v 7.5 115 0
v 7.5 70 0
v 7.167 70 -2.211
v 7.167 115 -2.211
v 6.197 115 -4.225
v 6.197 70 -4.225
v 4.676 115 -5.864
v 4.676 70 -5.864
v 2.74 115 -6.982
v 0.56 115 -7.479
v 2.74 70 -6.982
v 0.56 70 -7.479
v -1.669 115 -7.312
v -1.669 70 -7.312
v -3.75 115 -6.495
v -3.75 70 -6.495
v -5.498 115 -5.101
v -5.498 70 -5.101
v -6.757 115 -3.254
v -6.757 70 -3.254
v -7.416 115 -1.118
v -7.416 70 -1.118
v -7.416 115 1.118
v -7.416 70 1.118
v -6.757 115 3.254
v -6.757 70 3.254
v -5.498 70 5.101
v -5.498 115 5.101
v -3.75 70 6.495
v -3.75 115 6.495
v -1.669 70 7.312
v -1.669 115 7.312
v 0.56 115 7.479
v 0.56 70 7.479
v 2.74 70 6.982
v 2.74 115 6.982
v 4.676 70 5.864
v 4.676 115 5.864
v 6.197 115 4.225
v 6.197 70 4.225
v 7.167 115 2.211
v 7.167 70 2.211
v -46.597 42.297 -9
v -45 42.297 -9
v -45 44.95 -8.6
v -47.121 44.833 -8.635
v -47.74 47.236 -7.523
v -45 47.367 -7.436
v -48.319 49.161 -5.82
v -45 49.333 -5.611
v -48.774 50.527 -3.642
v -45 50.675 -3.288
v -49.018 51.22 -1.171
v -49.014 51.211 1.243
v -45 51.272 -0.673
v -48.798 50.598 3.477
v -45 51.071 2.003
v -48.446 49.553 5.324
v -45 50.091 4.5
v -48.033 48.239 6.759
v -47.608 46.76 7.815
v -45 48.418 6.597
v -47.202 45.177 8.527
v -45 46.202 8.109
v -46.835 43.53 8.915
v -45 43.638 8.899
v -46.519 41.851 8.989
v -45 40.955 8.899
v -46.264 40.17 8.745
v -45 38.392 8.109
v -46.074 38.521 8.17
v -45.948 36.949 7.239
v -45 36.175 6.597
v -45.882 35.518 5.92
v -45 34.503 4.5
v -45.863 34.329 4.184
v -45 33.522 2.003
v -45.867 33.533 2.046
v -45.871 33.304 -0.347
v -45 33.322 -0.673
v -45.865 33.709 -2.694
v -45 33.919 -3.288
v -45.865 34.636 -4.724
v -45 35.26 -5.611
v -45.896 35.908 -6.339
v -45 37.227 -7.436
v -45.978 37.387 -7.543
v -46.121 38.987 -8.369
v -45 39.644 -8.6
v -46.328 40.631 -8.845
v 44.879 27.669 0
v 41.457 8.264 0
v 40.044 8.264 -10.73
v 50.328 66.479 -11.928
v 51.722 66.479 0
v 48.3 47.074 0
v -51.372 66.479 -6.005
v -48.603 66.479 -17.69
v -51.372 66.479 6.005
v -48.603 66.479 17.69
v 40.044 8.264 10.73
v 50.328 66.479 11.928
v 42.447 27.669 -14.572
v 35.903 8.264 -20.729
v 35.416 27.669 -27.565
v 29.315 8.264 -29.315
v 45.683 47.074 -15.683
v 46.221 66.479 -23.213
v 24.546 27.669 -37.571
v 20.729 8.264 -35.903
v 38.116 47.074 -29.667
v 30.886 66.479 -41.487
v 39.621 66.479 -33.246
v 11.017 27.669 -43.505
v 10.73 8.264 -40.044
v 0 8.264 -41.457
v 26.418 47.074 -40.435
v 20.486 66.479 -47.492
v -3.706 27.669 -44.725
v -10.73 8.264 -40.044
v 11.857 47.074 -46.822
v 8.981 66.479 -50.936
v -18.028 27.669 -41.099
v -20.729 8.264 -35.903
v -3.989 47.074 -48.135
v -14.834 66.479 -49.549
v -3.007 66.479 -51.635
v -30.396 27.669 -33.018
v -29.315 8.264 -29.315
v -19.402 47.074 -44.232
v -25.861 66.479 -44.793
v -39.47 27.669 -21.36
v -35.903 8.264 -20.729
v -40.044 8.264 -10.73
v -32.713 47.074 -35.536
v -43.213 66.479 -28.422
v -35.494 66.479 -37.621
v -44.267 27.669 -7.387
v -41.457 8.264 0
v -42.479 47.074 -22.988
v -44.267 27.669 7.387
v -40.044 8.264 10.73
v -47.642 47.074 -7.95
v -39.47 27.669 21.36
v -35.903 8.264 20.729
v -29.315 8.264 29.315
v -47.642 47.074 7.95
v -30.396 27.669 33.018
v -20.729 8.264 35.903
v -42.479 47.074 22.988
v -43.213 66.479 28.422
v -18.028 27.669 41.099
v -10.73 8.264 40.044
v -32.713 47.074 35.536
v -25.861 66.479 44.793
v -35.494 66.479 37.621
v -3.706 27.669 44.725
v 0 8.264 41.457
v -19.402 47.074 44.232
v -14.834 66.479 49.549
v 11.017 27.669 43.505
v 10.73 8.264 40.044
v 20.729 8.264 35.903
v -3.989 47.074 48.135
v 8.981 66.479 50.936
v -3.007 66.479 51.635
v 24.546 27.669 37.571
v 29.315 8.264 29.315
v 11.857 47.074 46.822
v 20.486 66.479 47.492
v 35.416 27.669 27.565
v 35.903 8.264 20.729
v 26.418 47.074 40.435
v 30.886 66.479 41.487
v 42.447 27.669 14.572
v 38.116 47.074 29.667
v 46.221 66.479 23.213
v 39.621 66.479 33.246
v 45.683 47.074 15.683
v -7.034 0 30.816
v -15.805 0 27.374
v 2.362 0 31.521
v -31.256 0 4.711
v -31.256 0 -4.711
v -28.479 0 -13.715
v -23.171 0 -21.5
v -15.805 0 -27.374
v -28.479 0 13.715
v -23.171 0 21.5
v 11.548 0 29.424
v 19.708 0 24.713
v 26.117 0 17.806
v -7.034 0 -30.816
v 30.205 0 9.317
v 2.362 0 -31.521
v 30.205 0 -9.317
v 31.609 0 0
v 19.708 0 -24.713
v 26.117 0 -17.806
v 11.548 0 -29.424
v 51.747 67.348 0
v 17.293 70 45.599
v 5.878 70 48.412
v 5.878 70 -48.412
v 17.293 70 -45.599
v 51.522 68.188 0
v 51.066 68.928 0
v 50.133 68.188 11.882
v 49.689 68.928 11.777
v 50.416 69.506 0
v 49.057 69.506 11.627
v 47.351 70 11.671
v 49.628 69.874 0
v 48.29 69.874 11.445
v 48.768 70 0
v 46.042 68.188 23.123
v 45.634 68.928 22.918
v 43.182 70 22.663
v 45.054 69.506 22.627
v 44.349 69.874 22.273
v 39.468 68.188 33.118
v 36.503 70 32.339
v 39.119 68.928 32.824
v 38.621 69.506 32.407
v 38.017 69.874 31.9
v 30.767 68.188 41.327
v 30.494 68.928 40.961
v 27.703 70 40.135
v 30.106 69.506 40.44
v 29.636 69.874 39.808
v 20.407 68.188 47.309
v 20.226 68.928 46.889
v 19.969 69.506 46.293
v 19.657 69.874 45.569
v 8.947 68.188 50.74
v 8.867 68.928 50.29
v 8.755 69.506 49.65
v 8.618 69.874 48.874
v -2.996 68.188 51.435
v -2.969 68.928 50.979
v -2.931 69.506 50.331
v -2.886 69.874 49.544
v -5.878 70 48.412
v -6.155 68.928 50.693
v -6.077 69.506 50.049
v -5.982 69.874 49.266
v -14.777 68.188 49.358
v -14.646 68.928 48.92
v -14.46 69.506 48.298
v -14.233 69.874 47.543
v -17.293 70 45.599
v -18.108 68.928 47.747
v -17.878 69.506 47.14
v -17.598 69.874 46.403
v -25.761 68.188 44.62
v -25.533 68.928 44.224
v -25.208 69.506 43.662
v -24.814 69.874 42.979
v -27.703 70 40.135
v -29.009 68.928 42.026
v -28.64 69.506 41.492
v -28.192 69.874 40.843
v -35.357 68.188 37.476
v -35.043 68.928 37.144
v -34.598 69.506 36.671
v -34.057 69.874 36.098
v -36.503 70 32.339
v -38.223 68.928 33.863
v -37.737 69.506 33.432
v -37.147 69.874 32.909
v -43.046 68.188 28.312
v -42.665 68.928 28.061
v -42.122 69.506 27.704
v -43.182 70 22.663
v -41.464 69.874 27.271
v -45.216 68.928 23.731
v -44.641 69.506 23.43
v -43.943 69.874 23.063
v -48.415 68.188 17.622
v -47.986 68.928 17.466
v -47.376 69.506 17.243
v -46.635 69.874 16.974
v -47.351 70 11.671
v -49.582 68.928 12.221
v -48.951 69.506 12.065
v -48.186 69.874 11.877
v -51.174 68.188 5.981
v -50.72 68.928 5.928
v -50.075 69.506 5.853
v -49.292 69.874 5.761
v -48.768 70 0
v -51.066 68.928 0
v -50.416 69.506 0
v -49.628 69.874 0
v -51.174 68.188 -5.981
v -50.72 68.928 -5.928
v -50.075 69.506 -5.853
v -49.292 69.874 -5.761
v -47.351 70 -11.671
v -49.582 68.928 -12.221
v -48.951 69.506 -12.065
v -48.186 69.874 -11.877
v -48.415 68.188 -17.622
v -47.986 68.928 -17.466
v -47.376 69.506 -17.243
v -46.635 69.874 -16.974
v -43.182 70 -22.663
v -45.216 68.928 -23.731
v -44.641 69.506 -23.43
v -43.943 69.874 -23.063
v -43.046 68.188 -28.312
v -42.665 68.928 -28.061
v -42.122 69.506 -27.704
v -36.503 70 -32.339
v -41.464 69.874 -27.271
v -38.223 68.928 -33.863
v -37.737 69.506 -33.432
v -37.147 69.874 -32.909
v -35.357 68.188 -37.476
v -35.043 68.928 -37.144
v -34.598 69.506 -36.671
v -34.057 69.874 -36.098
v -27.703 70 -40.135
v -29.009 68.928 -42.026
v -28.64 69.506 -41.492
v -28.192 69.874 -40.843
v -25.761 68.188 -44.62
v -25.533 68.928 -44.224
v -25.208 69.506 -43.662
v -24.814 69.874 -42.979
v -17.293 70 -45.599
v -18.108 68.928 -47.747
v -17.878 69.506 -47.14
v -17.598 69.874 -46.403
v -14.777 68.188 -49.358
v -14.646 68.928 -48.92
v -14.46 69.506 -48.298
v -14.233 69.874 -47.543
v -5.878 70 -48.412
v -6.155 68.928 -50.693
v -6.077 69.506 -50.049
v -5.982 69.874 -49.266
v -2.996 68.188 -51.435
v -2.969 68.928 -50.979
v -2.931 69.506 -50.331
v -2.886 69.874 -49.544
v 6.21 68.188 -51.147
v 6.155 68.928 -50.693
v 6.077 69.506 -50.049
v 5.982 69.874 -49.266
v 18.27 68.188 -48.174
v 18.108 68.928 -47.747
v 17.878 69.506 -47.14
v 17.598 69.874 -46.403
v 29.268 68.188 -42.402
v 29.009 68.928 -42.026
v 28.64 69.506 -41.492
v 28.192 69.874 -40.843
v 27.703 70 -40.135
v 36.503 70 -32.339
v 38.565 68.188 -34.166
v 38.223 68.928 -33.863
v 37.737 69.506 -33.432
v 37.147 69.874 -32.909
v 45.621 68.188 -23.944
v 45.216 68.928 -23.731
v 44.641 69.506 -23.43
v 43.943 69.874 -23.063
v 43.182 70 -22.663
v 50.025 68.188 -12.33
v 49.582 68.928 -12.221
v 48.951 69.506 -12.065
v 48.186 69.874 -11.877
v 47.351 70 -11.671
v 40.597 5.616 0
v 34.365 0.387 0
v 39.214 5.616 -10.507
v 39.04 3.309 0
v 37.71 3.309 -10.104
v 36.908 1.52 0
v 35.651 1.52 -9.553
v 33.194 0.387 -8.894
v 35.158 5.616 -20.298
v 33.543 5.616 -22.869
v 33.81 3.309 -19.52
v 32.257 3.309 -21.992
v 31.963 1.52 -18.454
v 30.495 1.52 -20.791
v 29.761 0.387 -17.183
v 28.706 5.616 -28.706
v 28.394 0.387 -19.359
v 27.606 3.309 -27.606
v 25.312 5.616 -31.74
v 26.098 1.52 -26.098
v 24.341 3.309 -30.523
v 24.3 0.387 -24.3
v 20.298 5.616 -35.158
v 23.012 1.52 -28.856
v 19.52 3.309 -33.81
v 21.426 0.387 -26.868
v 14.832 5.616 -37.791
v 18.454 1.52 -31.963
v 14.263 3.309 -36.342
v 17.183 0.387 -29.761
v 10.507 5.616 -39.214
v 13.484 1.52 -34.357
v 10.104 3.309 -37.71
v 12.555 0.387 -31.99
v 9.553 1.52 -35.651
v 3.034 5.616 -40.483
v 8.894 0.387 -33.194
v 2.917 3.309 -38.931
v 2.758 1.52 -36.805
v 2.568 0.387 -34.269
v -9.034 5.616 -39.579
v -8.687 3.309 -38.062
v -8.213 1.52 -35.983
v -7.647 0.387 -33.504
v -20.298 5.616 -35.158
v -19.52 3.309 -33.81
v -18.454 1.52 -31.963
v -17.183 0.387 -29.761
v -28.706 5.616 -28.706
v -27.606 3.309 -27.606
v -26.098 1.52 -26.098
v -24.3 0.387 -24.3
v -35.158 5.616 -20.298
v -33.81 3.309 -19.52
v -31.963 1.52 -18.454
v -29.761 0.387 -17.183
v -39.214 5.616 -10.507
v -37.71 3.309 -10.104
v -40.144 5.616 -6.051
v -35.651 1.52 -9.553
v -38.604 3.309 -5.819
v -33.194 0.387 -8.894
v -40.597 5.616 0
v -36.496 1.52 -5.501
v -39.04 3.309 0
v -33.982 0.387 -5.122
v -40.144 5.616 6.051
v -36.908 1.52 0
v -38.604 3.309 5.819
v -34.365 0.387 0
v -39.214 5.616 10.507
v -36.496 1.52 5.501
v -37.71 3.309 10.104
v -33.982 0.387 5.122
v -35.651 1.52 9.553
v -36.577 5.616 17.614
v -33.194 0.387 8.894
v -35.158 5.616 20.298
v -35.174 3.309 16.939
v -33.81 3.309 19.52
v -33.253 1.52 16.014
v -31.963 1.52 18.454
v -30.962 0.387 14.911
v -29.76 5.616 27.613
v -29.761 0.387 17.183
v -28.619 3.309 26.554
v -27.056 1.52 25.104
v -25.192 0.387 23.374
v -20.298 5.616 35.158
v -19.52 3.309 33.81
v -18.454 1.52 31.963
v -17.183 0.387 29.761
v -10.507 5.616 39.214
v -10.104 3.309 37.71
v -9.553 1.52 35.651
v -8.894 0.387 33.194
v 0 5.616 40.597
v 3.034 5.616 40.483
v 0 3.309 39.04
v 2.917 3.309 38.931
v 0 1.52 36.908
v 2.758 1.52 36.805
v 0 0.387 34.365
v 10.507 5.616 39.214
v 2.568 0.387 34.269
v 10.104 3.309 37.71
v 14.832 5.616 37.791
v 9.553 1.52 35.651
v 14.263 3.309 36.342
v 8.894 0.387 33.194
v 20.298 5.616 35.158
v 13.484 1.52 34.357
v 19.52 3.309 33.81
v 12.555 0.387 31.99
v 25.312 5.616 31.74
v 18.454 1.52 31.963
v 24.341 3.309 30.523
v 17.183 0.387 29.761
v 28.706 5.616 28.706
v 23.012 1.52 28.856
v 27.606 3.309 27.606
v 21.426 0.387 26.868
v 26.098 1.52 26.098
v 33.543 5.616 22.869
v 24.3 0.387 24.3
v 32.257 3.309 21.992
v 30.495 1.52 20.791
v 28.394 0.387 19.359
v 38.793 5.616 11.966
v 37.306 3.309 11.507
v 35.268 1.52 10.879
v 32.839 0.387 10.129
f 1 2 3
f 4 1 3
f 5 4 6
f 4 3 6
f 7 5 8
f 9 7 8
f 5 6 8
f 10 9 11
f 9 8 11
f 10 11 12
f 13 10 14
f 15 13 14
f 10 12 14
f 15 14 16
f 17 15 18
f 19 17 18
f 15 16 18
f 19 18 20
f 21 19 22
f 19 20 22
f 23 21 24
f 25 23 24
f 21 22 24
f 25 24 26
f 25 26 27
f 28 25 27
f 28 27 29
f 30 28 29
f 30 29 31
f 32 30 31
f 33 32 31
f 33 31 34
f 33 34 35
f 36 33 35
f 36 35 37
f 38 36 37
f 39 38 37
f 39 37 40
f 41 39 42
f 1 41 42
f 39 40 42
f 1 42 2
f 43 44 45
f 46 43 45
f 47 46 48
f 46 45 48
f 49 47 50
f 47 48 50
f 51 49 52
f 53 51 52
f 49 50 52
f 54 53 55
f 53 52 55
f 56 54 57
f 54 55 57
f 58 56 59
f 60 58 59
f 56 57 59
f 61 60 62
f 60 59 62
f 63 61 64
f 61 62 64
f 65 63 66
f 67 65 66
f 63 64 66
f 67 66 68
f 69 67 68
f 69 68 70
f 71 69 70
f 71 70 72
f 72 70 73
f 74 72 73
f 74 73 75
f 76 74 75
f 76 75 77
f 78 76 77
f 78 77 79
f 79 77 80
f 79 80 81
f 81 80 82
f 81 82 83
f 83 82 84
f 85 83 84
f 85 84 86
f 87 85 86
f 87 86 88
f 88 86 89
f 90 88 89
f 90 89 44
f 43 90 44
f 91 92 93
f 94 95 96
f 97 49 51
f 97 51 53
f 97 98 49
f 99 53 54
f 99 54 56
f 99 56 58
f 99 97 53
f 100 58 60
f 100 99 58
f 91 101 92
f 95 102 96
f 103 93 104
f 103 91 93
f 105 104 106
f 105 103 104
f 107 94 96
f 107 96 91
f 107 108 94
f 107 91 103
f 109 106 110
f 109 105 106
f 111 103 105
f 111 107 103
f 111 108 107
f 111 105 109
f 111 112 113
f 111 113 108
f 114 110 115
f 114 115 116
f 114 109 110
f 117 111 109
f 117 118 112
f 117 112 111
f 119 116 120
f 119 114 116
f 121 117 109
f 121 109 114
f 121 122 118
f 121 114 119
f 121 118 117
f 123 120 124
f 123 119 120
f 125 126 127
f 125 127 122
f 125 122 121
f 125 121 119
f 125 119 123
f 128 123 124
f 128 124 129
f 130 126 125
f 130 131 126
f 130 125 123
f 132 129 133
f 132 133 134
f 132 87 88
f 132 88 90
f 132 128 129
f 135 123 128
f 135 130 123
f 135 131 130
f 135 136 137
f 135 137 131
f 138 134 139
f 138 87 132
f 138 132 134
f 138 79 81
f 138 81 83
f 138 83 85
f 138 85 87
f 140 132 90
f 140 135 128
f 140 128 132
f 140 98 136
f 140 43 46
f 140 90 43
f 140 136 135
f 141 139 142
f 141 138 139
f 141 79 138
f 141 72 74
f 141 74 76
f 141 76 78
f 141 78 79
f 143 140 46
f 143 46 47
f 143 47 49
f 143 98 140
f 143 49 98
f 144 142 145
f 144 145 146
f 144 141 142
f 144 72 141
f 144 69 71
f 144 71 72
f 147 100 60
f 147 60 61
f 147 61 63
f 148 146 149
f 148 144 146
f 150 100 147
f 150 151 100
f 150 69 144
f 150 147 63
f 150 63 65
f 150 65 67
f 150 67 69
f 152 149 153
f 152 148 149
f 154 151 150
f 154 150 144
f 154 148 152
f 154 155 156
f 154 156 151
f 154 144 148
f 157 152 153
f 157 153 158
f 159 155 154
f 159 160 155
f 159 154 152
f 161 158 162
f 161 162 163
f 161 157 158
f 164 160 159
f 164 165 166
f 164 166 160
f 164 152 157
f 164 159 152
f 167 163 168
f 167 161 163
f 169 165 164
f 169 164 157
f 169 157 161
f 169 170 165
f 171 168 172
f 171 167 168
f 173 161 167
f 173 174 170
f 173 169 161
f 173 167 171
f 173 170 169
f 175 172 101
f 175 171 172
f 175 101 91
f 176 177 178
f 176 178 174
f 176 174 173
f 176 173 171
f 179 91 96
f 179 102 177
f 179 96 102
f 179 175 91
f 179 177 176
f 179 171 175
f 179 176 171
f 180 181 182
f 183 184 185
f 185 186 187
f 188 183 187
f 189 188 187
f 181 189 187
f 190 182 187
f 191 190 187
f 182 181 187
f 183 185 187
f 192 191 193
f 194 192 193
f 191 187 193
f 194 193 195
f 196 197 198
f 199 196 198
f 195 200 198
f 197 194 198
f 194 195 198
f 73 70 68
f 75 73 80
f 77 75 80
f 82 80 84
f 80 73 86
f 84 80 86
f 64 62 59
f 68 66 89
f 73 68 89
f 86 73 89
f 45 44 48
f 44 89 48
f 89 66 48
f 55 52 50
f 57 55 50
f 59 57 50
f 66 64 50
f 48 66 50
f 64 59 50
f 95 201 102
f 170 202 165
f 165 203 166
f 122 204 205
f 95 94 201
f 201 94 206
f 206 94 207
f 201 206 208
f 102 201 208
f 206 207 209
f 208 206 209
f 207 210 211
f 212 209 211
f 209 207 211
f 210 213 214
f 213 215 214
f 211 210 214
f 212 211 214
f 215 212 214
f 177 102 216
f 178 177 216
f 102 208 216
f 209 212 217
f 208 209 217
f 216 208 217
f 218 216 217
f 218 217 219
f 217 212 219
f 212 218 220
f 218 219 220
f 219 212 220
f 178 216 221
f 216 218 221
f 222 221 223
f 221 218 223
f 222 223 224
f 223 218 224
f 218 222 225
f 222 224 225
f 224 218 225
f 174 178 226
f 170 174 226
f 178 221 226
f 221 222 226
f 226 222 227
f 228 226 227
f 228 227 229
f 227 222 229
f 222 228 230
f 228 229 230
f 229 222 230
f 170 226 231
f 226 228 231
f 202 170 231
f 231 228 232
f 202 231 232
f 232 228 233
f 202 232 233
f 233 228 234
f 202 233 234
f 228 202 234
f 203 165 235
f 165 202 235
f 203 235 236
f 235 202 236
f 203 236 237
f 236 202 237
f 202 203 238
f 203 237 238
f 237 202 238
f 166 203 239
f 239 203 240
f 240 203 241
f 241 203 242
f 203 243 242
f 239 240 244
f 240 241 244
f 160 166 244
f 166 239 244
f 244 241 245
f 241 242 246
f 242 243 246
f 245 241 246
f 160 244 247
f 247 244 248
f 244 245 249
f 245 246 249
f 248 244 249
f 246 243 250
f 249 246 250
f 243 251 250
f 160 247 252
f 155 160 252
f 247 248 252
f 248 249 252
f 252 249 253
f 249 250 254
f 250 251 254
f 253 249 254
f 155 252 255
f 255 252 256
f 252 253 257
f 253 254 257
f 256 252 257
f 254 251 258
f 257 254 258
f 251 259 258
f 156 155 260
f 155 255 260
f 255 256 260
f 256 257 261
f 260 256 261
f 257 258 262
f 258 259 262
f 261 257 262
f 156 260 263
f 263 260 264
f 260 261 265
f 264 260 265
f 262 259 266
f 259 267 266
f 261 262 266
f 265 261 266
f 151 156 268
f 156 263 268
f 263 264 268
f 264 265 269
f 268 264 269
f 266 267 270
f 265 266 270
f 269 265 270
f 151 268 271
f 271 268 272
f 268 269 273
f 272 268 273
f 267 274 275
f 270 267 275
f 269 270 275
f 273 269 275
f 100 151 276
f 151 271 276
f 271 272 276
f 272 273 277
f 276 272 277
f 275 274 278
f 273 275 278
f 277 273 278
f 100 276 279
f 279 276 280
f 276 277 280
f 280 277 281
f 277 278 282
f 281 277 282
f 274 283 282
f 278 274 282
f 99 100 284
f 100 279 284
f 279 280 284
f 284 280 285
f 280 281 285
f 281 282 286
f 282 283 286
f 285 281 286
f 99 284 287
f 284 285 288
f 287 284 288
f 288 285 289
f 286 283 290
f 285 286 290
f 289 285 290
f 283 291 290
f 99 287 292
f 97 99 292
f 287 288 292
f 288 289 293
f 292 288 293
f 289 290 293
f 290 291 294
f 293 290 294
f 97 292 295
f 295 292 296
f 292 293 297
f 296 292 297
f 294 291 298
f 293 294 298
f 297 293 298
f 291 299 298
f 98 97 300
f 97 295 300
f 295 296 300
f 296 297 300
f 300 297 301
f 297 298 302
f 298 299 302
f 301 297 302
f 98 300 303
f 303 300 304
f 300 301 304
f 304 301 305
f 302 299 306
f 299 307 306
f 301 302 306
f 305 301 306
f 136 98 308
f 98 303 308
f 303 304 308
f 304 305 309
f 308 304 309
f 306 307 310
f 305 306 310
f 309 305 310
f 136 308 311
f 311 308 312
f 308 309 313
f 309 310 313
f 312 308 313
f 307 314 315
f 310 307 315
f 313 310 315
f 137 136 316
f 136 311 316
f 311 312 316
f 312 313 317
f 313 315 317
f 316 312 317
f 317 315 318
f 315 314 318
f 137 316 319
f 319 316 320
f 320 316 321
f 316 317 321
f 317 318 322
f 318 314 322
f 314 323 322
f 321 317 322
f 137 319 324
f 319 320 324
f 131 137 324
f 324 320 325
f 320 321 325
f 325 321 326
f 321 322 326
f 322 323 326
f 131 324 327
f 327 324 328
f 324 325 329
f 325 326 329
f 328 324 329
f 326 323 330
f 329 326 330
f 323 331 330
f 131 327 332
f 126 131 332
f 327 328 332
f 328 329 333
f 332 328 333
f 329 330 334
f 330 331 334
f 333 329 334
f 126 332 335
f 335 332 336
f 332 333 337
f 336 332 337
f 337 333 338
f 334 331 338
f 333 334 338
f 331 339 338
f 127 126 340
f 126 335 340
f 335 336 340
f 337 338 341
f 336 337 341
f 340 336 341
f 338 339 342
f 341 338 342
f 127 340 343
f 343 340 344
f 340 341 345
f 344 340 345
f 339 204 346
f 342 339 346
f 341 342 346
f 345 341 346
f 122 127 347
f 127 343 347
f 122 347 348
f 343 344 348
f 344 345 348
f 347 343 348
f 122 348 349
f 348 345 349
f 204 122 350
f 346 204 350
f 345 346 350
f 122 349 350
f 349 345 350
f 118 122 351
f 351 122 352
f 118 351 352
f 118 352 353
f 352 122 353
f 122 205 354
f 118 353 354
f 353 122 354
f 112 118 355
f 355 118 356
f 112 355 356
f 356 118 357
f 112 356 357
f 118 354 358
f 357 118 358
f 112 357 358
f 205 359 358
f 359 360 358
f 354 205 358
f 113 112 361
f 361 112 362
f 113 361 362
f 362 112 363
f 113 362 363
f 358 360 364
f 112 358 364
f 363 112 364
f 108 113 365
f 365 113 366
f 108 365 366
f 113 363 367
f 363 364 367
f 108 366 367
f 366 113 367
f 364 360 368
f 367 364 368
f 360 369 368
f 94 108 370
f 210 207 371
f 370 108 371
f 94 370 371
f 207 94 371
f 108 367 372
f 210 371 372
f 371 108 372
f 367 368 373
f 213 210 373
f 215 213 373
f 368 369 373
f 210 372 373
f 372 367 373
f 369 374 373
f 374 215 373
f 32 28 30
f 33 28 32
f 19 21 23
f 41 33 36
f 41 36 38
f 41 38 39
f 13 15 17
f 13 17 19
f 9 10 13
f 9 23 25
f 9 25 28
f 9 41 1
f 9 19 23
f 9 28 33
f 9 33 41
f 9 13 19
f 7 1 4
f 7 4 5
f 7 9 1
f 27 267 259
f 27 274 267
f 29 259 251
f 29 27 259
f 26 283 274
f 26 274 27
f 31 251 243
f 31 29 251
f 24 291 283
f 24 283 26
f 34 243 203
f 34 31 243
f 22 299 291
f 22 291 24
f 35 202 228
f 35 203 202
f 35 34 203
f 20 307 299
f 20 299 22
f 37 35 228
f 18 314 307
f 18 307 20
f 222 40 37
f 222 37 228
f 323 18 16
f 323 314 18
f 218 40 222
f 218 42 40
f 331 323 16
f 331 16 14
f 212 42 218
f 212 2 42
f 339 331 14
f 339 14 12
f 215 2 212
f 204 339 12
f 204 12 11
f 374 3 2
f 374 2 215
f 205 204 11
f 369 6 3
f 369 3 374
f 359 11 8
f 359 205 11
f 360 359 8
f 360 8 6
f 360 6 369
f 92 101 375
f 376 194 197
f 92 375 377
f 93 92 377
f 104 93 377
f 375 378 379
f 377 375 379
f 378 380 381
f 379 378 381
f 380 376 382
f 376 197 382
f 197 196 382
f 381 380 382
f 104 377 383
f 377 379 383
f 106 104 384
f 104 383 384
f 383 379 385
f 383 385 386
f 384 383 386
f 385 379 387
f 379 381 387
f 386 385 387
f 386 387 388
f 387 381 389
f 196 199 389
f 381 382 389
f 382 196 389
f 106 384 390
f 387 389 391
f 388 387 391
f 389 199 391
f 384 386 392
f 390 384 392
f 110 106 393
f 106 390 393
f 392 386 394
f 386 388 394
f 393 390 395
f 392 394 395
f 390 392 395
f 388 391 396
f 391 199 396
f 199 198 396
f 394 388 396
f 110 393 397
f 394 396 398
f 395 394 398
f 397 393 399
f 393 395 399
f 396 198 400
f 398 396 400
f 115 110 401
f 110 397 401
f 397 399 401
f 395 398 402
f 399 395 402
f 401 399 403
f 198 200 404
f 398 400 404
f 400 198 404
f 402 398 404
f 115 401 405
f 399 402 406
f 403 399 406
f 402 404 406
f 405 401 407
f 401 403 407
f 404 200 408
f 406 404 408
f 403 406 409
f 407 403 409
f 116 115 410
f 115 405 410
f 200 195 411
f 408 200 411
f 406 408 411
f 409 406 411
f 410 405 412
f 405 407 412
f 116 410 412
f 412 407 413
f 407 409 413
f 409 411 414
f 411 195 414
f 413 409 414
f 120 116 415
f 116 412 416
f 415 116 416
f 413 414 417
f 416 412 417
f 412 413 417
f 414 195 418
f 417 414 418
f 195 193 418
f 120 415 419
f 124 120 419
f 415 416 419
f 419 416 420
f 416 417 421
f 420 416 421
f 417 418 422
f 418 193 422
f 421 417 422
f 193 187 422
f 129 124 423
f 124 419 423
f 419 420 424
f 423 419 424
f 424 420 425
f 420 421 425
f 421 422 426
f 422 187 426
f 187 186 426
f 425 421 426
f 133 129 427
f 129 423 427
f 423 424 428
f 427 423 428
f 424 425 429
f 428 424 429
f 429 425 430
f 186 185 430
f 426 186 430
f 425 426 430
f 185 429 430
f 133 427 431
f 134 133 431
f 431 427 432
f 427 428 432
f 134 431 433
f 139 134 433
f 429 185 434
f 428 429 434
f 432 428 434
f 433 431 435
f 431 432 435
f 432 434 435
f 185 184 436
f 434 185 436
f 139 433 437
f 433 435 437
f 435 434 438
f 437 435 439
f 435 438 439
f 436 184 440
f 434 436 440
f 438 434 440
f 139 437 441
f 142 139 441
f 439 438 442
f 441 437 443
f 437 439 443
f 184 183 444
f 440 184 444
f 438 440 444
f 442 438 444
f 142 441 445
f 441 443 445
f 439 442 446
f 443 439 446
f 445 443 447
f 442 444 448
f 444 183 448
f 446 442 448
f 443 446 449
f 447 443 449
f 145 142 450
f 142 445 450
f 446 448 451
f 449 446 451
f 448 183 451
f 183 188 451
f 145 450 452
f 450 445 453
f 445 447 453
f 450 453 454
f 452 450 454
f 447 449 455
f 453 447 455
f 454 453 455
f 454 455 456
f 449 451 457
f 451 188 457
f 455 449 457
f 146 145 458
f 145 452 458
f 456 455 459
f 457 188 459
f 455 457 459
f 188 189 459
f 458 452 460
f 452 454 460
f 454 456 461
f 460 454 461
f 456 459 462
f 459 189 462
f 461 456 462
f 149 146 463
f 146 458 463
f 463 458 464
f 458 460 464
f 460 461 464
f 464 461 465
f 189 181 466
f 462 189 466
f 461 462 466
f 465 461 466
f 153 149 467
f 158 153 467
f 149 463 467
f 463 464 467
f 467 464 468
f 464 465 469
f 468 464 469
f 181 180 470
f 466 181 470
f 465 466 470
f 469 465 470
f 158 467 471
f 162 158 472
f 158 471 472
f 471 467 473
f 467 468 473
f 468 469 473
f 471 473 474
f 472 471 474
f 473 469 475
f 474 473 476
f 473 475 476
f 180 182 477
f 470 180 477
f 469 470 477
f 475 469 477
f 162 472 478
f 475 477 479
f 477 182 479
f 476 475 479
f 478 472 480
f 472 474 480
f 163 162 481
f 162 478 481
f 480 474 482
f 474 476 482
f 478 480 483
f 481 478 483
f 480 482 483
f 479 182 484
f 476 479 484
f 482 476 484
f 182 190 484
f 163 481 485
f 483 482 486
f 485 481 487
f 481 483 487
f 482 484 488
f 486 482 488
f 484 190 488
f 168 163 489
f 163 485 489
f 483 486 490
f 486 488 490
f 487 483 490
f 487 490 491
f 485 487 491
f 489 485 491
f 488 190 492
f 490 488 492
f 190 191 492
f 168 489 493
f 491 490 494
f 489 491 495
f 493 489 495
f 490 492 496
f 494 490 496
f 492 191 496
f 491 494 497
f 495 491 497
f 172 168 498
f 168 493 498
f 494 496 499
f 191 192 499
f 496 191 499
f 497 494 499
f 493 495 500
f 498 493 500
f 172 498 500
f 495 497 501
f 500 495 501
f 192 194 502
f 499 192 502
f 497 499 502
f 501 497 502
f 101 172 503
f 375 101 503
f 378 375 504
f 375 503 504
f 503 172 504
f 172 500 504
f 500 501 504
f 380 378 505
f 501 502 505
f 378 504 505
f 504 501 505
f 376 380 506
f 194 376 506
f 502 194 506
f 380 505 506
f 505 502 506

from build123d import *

# Parameters (mm, degrees)
SKETCH1_R           = 40
BOSS_EXTRUDE1_DEPTH = 70
BOSS_EXTRUDE1_TAPER = -10
CUT_EXTRUDE1_REACH  = 99.343
CUT_EXTRUDE1_START  = -45
SKETCH2_R           = 9
SKETCH3_R           = 7.5
BOSS_EXTRUDE2_DEPTH = 45
FILLET1_R           = 10
FILLET2_R           = 3


with BuildPart() as part:
    # Sketch1 → Boss-Extrude1 (new body)
    with BuildSketch(Plane(origin=(0, 0, 0), x_dir=(1, 0, 0), z_dir=(0, 1, 0))):
        Circle(SKETCH1_R)
    extrude(amount=BOSS_EXTRUDE1_DEPTH, taper=BOSS_EXTRUDE1_TAPER)

    # Sketch2 → Cut-Extrude1 (cut, up to next)
    with BuildSketch(Plane(origin=(0, 0, 0), x_dir=(0, 0, -1), z_dir=(1, 0, 0)).offset(CUT_EXTRUDE1_START), mode=Mode.PRIVATE) as cut_extrude1_sk1:
        with Locations((0, 42.296816006)):
            Circle(SKETCH2_R)
    cut_extrude1_tool1 = extrude(cut_extrude1_sk1.sketch, amount=-CUT_EXTRUDE1_REACH, mode=Mode.PRIVATE) & part.part
    add(cut_extrude1_tool1.solids().sort_by_distance((-45, 42.296816, 0))[0], mode=Mode.SUBTRACT)

    # Sketch3 → Boss-Extrude2 (add)
    with BuildSketch(Plane(origin=(0, 70, 0), x_dir=(1, 0, 0), z_dir=(0, 1, 0))):
        Circle(SKETCH3_R)
    extrude(amount=BOSS_EXTRUDE2_DEPTH)

    # Fillet1
    fillet1_edges = [part.edges().sort_by_distance(p)[0] for p in [
        (-40, 0, 0),
    ]]
    fillet(fillet1_edges, radius=FILLET1_R)

    # Fillet2
    fillet2_edges = [part.edges().sort_by_distance(p)[0] for p in [
        (-52.34288865, 70, 0),
    ]]
    fillet(fillet2_edges, radius=FILLET2_R)


solid = part.part
